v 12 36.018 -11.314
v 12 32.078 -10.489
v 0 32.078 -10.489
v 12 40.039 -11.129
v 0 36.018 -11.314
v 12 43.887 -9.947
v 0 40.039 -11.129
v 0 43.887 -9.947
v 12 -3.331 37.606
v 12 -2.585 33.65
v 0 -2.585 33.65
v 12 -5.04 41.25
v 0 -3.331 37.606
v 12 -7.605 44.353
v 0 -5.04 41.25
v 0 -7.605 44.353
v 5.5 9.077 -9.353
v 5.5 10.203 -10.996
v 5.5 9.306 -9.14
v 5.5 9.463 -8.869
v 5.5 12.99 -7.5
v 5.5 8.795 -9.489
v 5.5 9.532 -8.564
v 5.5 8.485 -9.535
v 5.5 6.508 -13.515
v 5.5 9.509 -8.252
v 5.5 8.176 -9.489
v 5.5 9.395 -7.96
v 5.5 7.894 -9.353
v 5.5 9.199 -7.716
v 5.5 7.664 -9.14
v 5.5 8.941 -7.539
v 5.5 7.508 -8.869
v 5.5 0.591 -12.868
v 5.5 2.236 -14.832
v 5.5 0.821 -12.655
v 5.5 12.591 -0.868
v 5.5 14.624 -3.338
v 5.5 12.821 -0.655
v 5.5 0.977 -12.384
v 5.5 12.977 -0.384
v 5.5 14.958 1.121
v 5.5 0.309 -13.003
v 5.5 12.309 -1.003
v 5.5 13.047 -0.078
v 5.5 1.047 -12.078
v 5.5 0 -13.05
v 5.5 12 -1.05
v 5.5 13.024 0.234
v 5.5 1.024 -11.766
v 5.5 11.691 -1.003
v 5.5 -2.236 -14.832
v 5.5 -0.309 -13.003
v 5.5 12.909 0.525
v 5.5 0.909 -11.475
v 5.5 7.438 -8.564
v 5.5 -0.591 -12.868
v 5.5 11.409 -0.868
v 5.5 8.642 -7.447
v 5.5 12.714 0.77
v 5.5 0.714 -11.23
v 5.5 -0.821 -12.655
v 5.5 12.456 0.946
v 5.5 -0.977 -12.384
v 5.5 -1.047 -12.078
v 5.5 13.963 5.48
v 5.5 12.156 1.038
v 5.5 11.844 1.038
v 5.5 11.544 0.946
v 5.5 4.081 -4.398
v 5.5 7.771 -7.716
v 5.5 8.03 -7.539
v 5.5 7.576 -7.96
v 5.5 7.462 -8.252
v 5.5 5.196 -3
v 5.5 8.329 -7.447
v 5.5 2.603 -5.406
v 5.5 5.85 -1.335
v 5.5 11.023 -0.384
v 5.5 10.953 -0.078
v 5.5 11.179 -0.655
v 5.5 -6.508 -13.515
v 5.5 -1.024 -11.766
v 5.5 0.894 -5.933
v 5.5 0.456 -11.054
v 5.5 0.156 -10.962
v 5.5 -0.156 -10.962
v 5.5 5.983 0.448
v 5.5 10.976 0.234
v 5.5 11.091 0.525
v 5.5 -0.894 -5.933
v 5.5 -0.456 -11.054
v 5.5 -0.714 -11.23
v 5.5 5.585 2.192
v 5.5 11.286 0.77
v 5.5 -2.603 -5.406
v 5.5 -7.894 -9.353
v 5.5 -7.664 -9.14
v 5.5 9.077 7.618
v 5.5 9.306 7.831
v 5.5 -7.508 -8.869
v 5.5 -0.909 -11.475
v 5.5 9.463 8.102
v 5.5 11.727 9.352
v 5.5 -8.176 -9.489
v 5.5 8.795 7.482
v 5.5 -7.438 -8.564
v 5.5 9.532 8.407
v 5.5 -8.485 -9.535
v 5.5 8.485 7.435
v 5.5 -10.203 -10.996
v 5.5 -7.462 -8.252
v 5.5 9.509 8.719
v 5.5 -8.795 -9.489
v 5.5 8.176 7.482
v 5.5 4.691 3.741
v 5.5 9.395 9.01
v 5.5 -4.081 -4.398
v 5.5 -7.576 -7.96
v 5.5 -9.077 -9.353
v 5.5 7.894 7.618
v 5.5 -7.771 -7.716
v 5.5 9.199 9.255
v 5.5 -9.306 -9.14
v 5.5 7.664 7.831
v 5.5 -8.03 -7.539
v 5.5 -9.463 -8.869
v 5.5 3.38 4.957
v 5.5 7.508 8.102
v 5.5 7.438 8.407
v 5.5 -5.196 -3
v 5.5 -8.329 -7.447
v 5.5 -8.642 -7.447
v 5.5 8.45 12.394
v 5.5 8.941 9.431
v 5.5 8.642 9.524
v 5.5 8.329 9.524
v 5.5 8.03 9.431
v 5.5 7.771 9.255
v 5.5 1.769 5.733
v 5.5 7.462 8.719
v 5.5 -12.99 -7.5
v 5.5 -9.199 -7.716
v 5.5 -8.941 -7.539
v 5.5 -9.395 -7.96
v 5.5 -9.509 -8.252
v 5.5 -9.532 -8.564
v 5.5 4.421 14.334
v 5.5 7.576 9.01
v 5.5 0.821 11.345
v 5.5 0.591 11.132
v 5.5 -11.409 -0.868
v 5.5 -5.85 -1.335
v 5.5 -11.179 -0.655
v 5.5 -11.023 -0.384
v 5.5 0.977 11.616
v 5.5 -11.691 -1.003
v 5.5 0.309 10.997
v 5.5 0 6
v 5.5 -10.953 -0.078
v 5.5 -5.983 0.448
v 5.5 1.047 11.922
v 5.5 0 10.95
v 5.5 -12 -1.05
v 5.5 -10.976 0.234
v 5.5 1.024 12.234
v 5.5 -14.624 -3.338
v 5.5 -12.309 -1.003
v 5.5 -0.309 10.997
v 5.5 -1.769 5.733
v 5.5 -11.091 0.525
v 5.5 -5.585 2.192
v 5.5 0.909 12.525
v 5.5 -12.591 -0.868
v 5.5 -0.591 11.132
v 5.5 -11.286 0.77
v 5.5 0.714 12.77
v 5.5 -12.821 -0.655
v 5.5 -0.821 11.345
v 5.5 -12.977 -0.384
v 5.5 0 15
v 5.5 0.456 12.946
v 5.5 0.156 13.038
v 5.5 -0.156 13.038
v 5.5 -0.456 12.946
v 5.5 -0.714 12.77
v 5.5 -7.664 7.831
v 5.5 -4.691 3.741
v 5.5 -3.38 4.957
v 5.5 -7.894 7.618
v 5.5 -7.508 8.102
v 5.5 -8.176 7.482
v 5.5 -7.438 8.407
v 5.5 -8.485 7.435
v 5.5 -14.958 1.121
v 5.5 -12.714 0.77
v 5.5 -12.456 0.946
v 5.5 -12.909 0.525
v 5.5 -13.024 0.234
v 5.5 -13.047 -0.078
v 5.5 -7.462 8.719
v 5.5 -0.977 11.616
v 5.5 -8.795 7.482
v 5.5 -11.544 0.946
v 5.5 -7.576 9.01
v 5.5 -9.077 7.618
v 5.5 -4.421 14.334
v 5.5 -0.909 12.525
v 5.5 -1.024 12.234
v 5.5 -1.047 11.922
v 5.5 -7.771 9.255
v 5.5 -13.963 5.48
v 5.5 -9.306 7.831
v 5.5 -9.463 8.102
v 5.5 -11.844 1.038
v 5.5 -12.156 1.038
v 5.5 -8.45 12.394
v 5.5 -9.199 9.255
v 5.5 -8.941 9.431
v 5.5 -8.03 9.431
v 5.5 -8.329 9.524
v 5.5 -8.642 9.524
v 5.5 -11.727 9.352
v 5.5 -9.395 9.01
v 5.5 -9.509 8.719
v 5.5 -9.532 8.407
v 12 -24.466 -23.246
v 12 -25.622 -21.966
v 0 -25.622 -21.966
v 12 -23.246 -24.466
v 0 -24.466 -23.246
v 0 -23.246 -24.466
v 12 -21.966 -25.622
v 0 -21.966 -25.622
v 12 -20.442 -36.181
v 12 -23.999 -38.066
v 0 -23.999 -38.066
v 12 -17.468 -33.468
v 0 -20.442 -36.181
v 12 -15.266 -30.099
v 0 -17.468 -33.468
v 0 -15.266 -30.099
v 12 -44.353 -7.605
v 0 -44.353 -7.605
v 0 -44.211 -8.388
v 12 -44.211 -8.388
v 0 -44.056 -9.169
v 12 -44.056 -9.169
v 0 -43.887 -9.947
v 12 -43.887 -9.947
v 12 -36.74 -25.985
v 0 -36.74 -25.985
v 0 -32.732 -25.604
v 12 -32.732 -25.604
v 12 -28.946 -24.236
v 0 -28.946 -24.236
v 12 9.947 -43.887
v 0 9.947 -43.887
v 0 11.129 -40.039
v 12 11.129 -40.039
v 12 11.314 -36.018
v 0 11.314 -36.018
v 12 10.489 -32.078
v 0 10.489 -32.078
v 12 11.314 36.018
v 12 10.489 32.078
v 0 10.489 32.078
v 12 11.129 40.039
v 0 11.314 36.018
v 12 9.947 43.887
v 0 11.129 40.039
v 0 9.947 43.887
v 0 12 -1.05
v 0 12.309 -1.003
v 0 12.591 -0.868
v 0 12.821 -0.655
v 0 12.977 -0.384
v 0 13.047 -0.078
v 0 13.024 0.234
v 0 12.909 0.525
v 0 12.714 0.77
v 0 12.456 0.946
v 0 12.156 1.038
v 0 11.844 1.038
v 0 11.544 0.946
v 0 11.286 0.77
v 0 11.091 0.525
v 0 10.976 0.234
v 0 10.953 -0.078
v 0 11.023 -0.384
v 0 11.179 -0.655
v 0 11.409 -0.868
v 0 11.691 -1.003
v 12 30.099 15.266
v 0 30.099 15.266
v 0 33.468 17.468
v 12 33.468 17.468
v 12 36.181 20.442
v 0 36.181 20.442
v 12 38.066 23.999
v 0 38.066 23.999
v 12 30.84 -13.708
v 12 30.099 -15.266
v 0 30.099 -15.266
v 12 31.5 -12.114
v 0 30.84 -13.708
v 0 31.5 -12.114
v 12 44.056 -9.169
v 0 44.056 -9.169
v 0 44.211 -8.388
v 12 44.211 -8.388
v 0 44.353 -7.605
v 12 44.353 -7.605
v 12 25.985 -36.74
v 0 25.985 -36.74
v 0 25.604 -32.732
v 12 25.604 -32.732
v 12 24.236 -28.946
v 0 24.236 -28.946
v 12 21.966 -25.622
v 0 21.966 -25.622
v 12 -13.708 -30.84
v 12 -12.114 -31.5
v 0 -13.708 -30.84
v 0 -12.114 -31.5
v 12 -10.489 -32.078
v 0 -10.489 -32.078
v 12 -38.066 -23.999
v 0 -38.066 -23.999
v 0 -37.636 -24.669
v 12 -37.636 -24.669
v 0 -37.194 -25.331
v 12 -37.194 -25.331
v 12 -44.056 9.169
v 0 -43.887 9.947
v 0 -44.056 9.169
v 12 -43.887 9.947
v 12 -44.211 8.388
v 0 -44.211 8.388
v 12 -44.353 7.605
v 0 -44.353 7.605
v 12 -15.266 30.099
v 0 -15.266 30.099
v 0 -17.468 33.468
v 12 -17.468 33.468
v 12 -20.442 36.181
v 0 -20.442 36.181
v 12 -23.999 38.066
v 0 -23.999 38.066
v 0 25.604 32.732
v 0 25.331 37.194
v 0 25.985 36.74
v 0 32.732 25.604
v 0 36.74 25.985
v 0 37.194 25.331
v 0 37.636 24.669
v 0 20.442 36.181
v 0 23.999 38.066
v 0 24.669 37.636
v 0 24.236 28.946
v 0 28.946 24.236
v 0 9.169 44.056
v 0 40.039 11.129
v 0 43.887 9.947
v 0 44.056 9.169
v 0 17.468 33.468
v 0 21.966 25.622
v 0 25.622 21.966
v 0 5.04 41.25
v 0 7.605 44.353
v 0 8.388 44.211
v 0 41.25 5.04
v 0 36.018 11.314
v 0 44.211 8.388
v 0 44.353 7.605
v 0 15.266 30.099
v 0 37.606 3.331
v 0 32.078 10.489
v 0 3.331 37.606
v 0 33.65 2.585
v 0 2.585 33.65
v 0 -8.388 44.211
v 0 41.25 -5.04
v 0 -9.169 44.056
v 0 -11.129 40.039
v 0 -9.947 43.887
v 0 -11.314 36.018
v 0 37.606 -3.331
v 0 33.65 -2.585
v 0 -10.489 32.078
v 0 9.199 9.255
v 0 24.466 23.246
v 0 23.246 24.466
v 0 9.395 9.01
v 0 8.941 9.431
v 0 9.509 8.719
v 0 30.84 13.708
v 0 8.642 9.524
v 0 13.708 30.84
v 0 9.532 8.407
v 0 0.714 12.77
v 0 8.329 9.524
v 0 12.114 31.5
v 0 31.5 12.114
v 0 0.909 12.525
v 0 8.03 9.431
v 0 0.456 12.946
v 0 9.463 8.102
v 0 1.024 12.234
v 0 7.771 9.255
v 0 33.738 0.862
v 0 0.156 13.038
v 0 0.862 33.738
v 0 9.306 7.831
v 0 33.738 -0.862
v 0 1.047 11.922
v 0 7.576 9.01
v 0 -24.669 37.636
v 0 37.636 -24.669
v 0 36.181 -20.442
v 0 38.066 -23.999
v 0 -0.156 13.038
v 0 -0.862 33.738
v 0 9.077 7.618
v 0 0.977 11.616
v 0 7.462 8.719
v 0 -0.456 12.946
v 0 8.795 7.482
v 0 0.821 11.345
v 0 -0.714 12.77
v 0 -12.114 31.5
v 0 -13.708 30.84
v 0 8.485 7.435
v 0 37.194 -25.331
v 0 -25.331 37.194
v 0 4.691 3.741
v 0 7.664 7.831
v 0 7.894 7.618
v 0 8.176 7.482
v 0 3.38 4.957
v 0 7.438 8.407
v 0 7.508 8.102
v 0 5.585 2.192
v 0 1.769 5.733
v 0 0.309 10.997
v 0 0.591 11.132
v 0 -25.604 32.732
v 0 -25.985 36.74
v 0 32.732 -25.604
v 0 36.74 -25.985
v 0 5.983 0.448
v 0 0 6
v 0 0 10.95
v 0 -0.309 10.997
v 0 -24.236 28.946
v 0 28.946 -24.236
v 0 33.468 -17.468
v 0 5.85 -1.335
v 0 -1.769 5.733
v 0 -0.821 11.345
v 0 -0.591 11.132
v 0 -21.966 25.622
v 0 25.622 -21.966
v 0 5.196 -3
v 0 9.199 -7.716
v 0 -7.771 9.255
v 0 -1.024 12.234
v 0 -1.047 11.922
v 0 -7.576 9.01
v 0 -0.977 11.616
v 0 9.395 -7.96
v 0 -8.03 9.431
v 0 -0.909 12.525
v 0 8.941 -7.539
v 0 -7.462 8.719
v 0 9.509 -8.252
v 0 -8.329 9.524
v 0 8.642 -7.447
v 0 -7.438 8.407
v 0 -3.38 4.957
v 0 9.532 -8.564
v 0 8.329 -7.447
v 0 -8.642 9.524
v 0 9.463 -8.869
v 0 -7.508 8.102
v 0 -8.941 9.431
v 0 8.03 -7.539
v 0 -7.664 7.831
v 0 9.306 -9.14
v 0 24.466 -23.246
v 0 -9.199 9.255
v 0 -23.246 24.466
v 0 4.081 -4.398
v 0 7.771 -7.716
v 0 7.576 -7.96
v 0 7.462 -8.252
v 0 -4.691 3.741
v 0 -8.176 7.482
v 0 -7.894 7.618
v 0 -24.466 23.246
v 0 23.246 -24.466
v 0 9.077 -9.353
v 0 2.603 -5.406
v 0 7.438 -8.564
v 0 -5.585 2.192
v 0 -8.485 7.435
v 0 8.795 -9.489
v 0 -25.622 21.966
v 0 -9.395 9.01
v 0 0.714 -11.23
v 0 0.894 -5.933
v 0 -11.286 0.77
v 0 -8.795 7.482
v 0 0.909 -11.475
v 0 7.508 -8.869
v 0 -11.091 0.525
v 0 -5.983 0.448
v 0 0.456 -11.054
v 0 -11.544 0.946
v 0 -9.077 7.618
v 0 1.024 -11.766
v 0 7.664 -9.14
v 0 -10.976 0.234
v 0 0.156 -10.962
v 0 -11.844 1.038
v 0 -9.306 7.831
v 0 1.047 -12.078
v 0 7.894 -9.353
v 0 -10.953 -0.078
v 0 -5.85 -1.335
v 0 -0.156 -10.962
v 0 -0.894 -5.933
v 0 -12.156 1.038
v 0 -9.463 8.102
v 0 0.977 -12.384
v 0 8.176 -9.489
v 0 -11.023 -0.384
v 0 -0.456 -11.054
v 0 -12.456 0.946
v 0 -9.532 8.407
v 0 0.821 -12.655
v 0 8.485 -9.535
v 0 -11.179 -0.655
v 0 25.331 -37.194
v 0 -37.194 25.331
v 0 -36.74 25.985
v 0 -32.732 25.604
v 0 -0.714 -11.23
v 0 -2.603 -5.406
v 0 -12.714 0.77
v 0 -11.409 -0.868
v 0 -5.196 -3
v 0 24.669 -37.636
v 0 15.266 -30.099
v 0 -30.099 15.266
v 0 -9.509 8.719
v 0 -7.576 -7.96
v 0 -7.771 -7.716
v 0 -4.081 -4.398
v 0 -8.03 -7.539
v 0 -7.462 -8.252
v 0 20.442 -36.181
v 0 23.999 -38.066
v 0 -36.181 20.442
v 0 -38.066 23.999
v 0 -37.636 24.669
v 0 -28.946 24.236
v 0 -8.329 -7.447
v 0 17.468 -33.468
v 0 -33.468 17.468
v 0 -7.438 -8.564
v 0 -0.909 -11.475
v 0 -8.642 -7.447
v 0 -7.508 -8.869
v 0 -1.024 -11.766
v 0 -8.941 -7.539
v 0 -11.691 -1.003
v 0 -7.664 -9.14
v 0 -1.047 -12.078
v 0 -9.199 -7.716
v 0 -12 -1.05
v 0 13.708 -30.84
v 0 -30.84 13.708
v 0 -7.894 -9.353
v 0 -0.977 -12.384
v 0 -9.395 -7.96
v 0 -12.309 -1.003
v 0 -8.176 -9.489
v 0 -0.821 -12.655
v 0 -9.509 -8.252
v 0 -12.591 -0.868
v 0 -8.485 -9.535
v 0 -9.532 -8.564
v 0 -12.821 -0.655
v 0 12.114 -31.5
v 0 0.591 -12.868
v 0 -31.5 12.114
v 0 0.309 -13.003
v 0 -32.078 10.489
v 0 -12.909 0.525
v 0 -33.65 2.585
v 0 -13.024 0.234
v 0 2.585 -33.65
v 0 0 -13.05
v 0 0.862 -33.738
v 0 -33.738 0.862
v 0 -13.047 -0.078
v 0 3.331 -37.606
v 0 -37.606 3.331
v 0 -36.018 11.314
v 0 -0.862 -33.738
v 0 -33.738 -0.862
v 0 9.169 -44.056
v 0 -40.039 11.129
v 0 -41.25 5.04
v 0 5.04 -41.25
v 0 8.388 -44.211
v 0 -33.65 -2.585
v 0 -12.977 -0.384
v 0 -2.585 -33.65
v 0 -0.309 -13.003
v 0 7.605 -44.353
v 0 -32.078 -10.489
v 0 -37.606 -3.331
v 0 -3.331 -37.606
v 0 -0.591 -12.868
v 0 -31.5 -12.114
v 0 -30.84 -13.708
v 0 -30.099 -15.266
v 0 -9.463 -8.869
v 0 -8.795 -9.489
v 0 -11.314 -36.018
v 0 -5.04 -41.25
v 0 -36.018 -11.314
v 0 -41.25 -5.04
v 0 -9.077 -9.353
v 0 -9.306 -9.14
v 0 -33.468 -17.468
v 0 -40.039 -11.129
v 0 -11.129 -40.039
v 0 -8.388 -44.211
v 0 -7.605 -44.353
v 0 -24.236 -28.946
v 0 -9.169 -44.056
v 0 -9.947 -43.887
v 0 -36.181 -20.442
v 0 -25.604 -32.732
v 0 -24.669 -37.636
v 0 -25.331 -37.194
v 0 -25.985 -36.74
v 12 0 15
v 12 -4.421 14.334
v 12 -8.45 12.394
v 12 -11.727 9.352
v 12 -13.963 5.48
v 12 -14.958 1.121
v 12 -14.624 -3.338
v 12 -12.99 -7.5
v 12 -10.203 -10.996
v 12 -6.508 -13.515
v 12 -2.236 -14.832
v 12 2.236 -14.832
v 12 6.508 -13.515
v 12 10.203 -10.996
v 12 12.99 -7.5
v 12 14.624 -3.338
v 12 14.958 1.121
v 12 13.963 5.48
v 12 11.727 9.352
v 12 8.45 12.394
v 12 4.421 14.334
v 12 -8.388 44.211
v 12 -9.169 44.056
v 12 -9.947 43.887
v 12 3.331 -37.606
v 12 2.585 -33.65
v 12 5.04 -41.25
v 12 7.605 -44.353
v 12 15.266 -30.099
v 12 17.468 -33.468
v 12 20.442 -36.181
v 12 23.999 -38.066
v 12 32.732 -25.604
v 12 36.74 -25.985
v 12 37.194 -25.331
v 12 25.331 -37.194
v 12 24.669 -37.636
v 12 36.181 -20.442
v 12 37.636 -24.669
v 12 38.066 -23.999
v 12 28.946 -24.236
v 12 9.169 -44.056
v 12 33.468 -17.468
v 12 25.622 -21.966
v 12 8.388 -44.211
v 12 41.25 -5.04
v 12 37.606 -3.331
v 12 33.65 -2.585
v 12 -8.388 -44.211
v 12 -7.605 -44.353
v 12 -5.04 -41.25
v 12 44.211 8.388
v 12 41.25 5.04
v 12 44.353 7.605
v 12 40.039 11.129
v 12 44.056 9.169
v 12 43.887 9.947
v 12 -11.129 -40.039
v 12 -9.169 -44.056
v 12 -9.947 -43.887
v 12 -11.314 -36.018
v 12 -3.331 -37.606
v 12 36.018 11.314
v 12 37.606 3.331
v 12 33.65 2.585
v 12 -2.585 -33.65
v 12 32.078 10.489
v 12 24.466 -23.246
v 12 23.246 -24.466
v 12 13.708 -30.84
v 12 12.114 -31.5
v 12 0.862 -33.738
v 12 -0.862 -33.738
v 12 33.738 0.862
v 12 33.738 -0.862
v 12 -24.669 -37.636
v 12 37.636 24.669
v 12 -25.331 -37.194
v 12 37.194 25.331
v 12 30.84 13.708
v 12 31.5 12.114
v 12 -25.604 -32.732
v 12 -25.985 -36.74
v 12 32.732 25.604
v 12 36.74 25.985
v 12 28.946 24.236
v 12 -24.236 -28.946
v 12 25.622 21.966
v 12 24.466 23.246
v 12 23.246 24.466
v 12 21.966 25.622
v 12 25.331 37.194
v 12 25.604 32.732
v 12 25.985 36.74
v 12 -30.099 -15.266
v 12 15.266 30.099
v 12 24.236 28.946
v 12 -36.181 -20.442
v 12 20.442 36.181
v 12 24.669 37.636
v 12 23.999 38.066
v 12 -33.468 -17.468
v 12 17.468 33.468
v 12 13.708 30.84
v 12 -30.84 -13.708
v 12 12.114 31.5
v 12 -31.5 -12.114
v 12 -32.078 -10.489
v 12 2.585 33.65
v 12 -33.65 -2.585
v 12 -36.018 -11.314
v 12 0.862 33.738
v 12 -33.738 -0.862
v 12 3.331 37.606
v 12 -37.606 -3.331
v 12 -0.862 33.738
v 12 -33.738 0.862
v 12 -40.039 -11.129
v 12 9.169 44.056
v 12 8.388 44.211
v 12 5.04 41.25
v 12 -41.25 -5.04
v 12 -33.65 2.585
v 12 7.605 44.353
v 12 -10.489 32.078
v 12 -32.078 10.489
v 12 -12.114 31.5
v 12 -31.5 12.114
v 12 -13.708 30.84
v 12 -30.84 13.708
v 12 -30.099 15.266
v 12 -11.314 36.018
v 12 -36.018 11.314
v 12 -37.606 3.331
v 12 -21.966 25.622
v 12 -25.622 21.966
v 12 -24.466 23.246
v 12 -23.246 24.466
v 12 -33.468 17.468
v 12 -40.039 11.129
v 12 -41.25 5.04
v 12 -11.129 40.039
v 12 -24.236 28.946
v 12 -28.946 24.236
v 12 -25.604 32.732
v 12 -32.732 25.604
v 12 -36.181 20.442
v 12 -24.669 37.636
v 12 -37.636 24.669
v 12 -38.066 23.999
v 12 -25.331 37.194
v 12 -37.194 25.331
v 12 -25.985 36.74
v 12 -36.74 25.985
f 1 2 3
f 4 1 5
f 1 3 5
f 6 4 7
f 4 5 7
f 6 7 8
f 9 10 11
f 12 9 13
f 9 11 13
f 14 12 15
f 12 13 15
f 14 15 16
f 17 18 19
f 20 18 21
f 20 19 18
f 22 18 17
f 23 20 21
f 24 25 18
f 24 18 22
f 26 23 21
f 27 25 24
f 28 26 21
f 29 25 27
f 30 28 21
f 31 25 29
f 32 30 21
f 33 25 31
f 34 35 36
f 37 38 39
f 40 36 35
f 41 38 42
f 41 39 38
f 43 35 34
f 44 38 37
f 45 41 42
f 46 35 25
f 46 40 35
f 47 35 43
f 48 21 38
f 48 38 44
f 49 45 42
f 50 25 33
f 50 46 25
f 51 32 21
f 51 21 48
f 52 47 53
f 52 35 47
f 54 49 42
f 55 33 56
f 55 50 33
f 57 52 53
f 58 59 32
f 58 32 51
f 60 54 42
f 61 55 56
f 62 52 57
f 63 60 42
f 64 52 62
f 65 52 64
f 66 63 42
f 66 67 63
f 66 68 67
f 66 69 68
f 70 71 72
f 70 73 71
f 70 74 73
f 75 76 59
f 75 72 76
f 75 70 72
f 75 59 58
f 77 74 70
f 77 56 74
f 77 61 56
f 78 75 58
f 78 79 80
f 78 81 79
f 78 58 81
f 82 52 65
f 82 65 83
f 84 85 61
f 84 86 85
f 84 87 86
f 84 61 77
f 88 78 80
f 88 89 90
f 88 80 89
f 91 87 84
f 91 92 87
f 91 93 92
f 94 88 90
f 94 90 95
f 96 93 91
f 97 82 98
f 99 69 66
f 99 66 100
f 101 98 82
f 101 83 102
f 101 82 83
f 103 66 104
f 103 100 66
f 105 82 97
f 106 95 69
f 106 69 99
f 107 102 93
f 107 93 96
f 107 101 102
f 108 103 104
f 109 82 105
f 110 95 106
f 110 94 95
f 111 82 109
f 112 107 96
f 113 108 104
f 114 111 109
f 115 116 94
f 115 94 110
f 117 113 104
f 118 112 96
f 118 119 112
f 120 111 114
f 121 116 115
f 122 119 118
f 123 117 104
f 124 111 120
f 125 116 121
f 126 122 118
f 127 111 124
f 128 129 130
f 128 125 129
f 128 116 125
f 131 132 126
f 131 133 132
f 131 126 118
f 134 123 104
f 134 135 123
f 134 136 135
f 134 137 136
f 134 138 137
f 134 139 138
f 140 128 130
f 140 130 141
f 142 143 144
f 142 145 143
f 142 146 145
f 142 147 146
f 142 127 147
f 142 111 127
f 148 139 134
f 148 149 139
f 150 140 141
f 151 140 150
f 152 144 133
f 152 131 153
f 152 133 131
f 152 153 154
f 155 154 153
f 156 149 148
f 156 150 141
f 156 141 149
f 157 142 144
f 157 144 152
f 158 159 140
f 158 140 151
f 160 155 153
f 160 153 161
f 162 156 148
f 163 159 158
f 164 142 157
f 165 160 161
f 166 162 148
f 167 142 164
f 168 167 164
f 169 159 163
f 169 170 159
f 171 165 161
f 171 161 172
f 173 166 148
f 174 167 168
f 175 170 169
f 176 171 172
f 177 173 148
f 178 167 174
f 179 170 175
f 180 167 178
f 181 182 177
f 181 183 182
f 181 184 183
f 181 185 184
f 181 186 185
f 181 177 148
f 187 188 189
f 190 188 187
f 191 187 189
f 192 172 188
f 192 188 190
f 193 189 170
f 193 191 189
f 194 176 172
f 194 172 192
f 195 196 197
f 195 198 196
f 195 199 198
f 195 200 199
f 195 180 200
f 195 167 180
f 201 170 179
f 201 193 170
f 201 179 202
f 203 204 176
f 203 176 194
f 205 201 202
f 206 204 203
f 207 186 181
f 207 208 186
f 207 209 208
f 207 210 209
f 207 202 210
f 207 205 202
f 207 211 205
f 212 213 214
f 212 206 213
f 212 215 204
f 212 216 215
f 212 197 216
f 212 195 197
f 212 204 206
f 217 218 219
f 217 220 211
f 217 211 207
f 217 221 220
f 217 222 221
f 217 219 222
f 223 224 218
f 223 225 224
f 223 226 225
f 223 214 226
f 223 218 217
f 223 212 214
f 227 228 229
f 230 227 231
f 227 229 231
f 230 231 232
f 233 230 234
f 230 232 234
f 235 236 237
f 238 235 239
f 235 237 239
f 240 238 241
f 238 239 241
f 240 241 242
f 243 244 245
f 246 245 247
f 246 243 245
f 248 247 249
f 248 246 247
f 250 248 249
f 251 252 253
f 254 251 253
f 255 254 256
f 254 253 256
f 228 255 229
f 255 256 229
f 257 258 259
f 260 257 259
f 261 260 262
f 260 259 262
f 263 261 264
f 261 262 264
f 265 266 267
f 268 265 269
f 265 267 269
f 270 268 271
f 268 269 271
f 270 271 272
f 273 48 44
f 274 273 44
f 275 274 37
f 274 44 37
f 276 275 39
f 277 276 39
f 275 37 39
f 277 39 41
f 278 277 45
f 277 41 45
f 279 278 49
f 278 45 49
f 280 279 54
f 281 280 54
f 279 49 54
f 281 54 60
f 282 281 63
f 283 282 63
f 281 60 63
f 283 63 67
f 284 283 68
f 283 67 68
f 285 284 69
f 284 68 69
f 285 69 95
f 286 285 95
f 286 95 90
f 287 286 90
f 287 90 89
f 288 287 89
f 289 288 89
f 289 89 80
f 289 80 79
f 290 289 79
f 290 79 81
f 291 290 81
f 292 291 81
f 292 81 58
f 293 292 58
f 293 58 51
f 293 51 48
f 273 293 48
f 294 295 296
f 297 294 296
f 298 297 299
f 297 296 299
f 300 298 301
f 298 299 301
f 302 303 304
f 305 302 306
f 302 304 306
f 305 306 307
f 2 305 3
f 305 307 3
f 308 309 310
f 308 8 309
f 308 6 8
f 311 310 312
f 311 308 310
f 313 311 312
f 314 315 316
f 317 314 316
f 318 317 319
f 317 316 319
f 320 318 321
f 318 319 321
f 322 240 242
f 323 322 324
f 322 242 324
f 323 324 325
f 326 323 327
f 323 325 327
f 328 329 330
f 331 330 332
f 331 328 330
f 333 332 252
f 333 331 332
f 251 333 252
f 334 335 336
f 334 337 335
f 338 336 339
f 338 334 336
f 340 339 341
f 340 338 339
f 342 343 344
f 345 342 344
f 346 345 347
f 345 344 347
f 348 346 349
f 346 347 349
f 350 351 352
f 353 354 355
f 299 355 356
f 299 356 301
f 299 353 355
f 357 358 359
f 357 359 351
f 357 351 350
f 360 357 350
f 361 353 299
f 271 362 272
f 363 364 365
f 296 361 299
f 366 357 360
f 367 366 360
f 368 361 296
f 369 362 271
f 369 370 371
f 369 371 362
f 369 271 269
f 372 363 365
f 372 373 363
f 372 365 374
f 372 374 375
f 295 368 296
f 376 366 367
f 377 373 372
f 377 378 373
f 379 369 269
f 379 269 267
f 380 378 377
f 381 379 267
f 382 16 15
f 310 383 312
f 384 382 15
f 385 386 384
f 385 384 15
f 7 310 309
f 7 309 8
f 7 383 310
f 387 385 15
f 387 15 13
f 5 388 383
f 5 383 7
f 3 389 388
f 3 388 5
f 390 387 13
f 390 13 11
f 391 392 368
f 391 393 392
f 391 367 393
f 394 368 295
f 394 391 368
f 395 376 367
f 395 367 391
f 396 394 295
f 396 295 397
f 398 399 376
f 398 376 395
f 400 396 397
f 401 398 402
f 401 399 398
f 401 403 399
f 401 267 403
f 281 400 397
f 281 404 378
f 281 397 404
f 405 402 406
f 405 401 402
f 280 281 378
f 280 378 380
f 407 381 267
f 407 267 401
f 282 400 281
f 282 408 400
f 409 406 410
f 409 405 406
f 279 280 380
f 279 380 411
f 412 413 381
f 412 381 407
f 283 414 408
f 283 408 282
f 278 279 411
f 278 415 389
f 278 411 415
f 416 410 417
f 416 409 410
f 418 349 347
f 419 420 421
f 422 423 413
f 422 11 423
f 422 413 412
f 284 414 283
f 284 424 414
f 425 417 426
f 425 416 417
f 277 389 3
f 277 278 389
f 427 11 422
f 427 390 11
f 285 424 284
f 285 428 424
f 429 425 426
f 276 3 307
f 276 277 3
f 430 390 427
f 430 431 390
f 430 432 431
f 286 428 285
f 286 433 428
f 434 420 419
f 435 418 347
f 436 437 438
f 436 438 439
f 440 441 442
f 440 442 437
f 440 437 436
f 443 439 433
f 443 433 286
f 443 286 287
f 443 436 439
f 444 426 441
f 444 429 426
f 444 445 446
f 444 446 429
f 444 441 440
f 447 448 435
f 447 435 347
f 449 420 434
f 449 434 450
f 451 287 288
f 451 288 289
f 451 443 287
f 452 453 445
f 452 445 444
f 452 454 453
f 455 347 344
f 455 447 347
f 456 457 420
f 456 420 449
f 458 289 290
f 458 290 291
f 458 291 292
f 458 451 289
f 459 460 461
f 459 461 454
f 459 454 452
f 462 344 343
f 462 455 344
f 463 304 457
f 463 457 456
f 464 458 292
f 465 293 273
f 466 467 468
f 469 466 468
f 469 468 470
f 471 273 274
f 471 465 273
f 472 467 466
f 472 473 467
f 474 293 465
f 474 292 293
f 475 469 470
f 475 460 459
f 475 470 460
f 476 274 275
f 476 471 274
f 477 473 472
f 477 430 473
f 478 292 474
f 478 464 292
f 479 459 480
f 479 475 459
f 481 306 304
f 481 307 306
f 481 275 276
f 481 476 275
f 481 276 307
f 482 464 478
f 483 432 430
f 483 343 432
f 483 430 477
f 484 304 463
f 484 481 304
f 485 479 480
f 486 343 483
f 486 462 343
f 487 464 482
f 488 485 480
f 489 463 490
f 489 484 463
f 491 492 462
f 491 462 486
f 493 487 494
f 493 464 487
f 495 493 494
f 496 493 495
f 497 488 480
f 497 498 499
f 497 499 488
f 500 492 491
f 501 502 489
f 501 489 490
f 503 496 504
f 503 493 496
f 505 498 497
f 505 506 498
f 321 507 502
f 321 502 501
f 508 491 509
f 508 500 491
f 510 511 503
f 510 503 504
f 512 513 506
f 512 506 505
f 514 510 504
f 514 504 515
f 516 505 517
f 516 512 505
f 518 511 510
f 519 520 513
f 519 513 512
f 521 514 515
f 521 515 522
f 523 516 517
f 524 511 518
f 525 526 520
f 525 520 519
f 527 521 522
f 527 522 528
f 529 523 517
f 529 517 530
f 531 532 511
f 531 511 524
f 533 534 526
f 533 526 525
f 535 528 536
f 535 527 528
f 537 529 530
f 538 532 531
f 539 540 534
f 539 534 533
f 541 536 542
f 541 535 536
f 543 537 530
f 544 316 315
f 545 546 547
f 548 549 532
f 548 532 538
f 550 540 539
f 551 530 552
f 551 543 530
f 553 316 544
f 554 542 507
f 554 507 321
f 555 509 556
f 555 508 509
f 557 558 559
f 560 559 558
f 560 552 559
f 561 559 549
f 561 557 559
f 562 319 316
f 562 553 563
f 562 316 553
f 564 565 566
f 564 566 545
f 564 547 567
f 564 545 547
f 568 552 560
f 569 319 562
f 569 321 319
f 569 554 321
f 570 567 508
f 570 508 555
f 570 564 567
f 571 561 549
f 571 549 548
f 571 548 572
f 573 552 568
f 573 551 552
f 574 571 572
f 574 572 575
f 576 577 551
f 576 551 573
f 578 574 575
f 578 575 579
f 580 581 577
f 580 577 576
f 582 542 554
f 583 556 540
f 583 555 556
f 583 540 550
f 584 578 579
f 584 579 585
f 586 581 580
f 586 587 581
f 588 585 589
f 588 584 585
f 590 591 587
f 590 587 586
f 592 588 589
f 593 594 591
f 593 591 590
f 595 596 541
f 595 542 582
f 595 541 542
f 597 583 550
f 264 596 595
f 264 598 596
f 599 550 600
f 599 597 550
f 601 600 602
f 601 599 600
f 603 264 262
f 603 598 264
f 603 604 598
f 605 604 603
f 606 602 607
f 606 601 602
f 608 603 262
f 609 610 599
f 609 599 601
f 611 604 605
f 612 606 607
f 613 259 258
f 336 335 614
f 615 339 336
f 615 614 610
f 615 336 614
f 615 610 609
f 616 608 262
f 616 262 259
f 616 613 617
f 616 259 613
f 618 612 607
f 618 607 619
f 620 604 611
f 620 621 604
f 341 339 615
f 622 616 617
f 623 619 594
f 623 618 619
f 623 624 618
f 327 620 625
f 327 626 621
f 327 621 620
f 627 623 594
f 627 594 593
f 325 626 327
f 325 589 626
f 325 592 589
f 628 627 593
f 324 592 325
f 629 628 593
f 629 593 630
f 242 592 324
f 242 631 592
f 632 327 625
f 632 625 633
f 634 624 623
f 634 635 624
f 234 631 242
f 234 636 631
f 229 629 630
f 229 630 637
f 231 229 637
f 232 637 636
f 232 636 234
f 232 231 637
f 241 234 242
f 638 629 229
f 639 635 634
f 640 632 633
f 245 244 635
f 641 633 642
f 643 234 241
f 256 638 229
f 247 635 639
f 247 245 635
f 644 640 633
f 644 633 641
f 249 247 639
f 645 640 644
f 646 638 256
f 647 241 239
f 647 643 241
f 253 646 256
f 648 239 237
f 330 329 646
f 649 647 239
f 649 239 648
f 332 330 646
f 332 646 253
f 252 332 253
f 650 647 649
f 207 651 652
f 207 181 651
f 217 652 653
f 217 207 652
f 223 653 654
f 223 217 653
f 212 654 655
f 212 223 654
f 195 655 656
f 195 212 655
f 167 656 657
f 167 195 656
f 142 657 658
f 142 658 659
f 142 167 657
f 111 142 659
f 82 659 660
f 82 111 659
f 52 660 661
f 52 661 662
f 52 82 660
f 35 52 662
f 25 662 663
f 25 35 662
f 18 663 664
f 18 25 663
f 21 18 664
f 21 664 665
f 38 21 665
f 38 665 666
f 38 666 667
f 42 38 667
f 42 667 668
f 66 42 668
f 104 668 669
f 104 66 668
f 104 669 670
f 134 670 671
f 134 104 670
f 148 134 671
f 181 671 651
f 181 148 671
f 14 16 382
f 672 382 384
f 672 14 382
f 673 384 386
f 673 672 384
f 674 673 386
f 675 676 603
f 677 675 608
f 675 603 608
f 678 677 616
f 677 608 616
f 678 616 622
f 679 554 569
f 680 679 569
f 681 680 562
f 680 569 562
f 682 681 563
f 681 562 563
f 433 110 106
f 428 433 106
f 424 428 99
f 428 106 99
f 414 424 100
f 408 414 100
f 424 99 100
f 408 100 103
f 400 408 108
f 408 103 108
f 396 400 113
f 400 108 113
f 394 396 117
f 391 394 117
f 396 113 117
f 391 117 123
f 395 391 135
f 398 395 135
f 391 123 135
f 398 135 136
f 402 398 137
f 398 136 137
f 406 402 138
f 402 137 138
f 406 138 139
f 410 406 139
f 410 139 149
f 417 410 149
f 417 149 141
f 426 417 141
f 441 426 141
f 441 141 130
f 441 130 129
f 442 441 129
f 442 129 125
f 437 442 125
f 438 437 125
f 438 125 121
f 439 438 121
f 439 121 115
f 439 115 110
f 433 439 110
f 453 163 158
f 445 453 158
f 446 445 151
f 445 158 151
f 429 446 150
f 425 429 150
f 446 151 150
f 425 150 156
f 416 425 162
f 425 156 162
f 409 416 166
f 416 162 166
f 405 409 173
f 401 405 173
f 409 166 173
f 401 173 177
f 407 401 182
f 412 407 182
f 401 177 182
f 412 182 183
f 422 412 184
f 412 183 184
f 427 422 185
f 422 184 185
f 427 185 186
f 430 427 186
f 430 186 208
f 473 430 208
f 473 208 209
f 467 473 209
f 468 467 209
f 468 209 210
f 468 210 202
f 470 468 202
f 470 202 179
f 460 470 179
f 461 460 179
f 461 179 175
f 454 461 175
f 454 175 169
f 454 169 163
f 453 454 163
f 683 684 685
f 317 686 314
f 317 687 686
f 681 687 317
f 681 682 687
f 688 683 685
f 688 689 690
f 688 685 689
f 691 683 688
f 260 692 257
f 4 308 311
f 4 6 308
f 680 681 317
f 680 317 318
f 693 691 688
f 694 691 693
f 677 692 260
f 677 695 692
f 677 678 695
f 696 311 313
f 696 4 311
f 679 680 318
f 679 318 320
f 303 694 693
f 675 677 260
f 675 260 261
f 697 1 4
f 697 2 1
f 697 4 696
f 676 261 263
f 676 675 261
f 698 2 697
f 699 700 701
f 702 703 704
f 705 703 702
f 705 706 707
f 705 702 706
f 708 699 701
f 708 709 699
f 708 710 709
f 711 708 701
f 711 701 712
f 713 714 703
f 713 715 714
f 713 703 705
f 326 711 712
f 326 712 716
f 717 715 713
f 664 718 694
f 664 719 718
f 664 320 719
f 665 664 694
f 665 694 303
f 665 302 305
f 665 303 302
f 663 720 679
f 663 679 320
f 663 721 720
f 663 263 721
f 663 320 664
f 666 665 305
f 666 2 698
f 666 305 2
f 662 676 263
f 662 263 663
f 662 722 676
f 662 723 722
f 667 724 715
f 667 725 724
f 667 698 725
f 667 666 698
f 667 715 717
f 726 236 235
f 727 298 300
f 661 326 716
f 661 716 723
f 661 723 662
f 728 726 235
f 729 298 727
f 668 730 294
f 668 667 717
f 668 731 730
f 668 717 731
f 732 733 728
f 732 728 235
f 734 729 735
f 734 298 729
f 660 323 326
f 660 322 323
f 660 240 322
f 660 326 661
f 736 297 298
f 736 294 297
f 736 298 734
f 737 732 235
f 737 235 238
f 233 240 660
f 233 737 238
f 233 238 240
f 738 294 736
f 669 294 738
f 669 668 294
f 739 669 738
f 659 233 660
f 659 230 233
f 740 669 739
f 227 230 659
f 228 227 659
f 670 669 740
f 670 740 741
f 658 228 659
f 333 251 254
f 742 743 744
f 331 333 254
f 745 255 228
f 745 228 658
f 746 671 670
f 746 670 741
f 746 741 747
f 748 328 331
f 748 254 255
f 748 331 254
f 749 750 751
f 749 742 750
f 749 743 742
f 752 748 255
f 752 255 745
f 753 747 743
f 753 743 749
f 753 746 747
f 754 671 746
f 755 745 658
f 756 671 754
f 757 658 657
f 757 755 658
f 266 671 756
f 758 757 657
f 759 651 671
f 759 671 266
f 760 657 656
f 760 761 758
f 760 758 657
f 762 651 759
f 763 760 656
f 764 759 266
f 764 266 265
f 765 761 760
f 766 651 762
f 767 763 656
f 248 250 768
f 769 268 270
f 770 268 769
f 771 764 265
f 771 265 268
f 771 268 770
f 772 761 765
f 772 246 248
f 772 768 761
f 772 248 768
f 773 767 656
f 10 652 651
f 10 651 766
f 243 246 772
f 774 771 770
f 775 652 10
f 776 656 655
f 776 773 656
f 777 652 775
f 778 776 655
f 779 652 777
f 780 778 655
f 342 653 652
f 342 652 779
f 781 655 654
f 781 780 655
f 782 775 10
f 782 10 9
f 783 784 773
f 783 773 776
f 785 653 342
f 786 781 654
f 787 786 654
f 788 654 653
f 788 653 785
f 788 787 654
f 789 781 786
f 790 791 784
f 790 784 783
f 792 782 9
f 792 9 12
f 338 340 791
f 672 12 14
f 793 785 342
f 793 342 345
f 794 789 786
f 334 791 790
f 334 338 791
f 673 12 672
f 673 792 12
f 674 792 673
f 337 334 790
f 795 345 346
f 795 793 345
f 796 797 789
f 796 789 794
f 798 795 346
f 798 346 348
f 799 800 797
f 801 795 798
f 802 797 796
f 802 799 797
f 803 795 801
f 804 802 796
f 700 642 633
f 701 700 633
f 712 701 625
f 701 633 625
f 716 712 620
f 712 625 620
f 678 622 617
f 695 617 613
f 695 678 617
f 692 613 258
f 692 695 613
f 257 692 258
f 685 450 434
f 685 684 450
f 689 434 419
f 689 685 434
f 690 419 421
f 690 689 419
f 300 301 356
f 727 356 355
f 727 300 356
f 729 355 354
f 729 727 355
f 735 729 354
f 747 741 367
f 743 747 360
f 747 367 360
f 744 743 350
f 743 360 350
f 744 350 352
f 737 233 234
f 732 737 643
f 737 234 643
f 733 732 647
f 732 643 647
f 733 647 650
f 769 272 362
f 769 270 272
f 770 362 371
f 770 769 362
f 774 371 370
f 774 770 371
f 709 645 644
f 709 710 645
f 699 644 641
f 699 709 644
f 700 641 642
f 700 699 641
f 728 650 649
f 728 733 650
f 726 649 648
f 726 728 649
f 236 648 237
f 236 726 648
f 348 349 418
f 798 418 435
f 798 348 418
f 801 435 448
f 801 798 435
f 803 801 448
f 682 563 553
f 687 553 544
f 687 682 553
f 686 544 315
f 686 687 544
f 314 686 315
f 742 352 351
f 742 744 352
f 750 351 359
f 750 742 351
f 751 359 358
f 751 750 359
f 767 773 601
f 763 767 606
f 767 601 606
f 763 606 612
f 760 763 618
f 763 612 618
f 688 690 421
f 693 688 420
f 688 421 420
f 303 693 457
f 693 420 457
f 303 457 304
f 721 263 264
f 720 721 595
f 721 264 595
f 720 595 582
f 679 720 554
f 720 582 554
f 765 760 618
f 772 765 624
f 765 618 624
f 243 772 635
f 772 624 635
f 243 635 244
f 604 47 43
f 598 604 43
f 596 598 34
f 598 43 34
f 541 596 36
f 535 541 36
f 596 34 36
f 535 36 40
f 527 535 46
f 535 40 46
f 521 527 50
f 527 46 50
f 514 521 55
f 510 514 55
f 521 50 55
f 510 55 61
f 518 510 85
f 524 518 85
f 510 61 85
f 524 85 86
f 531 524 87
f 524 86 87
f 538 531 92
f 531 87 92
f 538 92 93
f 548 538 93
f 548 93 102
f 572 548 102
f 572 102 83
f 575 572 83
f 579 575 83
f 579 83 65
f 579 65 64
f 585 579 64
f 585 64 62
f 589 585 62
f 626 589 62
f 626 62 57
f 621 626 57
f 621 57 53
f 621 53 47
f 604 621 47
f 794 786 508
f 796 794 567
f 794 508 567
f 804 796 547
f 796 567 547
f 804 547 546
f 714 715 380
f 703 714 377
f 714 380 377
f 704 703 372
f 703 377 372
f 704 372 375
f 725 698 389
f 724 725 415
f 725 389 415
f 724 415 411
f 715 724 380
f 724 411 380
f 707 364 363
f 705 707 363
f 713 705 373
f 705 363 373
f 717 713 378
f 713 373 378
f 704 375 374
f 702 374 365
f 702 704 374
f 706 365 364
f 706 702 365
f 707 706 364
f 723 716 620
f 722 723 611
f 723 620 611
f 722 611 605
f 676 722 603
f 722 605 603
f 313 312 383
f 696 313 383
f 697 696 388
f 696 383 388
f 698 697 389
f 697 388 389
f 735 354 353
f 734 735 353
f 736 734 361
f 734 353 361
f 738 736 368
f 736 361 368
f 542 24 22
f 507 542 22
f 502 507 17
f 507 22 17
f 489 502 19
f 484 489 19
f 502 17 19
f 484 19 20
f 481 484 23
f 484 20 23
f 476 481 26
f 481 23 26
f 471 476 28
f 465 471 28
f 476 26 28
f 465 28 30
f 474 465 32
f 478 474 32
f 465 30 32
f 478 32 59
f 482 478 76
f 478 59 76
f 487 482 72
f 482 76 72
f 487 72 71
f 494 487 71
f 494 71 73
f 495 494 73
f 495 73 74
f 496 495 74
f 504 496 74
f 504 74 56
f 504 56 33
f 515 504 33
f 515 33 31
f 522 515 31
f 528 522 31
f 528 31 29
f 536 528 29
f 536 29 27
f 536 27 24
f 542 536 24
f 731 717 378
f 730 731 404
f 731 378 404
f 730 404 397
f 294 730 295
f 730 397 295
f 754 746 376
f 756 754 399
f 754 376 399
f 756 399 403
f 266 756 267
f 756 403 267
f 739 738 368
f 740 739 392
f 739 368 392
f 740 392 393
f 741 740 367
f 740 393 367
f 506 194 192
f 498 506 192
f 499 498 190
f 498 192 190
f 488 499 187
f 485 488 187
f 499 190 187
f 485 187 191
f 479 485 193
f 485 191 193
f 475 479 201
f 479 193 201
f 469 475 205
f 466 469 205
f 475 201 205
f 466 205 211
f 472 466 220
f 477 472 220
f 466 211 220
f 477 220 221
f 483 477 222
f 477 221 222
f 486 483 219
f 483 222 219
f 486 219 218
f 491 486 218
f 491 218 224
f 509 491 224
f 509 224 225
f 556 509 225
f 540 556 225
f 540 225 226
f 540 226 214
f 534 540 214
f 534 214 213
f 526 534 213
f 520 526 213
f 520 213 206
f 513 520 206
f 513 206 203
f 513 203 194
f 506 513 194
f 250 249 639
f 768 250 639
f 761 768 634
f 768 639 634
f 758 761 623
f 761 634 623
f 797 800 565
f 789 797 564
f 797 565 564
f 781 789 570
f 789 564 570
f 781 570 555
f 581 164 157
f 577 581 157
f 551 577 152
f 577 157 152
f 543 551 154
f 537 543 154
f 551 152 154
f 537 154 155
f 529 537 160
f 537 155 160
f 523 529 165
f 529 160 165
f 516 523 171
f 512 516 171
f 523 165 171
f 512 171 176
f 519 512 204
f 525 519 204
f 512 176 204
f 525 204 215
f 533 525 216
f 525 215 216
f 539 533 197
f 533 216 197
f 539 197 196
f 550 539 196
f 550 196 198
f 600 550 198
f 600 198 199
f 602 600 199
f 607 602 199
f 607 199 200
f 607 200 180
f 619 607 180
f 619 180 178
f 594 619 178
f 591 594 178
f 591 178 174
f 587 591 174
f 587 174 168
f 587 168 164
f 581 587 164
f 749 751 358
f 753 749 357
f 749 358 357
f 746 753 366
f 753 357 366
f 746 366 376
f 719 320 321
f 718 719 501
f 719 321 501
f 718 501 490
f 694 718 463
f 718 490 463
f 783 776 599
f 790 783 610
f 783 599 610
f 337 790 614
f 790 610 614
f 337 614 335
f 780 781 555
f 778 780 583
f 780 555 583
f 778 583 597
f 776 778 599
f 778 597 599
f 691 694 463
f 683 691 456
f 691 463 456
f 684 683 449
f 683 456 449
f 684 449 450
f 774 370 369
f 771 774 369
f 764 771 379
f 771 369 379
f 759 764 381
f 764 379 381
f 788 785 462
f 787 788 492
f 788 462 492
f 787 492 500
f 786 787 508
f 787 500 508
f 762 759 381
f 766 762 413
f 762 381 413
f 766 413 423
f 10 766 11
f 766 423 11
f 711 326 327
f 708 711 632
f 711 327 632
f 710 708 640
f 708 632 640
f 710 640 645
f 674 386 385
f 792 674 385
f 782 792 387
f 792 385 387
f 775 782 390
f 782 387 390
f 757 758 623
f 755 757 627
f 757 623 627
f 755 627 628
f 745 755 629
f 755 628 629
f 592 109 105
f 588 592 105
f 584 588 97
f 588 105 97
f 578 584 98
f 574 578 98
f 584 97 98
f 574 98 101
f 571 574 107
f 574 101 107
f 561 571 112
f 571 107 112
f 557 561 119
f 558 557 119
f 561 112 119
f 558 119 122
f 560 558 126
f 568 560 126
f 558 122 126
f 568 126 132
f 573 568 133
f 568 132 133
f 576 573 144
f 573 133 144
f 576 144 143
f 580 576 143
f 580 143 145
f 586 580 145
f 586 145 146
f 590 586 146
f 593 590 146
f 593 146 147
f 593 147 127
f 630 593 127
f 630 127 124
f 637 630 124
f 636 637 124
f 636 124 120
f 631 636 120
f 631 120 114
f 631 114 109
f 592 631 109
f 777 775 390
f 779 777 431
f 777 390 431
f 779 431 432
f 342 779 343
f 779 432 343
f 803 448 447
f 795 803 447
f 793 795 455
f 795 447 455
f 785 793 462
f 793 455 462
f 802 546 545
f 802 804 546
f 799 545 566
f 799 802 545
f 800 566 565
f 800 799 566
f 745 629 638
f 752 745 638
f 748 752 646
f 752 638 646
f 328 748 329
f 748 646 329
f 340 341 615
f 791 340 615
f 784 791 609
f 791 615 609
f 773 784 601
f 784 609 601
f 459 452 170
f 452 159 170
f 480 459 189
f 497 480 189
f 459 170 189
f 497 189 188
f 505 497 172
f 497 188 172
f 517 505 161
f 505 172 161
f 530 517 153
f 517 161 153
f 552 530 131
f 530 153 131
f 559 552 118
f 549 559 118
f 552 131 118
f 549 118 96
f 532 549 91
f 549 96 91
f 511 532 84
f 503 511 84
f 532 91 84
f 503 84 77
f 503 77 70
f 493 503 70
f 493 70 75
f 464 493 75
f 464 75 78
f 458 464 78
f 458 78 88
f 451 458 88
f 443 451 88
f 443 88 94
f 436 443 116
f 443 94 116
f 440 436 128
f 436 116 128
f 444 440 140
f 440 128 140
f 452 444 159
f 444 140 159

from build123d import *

# Parameters (mm, degrees)
TOOTHCUT_DEPTH     = 65.761099435
TEETHCUTS_COUNT    = 16
TEETHCUTS_ANGLE    = 337.5
BORSKE_R           = 6
BORE_DEPTH         = 50.0000508
SKETCH1_R          = 1.05
CUT_EXTRUDE1_DEPTH = 120


with BuildPart() as part:
    # BasProSke → Base-Revolve (revolve)
    with BuildSketch(Plane(origin=(0, 0, 0), x_dir=(1, 0, 0), z_dir=(0, 1, 0)), mode=Mode.PRIVATE) as base_revolve_sk:
        Polygon((0, 0), (0, 45), (12, 45), (12, 15), (5.5, 15), (5.5, 6), (4, 6), (4, 0), align=None)
    revolve(base_revolve_sk.sketch.rotate(Axis((-10, 0, 0), (1, 0, 0)), 180), axis=Axis((-10, 0, 0), (1, 0, 0)))

    # TooCutSke → ToothCut (cut, through all)
    with BuildSketch(Plane(origin=(0, 0, 0), x_dir=(0, 0, -1), z_dir=(1, 0, 0))):
        with BuildLine():
            ThreePointArc((2.585211293, 33.64983928), (0, 33.749), (-2.585211293, 33.64983928))
            ThreePointArc((-2.585211293, 33.64983928), (-4.077113604, 39.496303475), (-7.62816215, 44.37451732))
            ThreePointArc((-7.62816215, 44.37451732), (0, 45.0254), (7.62816215, 44.37451732))
            ThreePointArc((7.62816215, 44.37451732), (4.077113604, 39.496303475), (2.585211293, 33.64983928))
        make_face()
    toothcut = extrude(amount=TOOTHCUT_DEPTH, mode=Mode.SUBTRACT)

    # TeethCuts: ToothCut ×16 about axis
    teethcuts_axis = Axis((-10, 0, 0), (1, 0, 0))
    for i in range(1, TEETHCUTS_COUNT):
        add(toothcut.rotate(teethcuts_axis, i * TEETHCUTS_ANGLE / (TEETHCUTS_COUNT - 1)), mode=Mode.SUBTRACT)

    # BorSke → Bore (cut, symmetric)
    with BuildSketch(Plane(origin=(0, 0, 0), x_dir=(0, 0, -1), z_dir=(1, 0, 0))):
        with Locations(Location((0, 0, 0), (0, 0, 180))):
            Circle(BORSKE_R)
    extrude(amount=BORE_DEPTH, both=True, mode=Mode.SUBTRACT)

    # Sketch1 → Cut-Extrude1 (cut)
    with BuildSketch(Plane(origin=(12, 0, 0), x_dir=(0, 0, -1), z_dir=(1, 0, 0))):
        with Locations((0, 12)):
            Circle(SKETCH1_R)
        with Locations((8.485281374, 8.485281374)):
            Circle(SKETCH1_R)
        with Locations((12, 0)):
            Circle(SKETCH1_R)
        with Locations((8.485281374, -8.485281374)):
            Circle(SKETCH1_R)
        with Locations((0, -12)):
            Circle(SKETCH1_R)
        with Locations((-8.485281374, -8.485281374)):
            Circle(SKETCH1_R)
        with Locations((-12, 0)):
            Circle(SKETCH1_R)
        with Locations((-8.485281374, 8.485281374)):
            Circle(SKETCH1_R)
    extrude(amount=-CUT_EXTRUDE1_DEPTH, mode=Mode.SUBTRACT)


solid = part.part
